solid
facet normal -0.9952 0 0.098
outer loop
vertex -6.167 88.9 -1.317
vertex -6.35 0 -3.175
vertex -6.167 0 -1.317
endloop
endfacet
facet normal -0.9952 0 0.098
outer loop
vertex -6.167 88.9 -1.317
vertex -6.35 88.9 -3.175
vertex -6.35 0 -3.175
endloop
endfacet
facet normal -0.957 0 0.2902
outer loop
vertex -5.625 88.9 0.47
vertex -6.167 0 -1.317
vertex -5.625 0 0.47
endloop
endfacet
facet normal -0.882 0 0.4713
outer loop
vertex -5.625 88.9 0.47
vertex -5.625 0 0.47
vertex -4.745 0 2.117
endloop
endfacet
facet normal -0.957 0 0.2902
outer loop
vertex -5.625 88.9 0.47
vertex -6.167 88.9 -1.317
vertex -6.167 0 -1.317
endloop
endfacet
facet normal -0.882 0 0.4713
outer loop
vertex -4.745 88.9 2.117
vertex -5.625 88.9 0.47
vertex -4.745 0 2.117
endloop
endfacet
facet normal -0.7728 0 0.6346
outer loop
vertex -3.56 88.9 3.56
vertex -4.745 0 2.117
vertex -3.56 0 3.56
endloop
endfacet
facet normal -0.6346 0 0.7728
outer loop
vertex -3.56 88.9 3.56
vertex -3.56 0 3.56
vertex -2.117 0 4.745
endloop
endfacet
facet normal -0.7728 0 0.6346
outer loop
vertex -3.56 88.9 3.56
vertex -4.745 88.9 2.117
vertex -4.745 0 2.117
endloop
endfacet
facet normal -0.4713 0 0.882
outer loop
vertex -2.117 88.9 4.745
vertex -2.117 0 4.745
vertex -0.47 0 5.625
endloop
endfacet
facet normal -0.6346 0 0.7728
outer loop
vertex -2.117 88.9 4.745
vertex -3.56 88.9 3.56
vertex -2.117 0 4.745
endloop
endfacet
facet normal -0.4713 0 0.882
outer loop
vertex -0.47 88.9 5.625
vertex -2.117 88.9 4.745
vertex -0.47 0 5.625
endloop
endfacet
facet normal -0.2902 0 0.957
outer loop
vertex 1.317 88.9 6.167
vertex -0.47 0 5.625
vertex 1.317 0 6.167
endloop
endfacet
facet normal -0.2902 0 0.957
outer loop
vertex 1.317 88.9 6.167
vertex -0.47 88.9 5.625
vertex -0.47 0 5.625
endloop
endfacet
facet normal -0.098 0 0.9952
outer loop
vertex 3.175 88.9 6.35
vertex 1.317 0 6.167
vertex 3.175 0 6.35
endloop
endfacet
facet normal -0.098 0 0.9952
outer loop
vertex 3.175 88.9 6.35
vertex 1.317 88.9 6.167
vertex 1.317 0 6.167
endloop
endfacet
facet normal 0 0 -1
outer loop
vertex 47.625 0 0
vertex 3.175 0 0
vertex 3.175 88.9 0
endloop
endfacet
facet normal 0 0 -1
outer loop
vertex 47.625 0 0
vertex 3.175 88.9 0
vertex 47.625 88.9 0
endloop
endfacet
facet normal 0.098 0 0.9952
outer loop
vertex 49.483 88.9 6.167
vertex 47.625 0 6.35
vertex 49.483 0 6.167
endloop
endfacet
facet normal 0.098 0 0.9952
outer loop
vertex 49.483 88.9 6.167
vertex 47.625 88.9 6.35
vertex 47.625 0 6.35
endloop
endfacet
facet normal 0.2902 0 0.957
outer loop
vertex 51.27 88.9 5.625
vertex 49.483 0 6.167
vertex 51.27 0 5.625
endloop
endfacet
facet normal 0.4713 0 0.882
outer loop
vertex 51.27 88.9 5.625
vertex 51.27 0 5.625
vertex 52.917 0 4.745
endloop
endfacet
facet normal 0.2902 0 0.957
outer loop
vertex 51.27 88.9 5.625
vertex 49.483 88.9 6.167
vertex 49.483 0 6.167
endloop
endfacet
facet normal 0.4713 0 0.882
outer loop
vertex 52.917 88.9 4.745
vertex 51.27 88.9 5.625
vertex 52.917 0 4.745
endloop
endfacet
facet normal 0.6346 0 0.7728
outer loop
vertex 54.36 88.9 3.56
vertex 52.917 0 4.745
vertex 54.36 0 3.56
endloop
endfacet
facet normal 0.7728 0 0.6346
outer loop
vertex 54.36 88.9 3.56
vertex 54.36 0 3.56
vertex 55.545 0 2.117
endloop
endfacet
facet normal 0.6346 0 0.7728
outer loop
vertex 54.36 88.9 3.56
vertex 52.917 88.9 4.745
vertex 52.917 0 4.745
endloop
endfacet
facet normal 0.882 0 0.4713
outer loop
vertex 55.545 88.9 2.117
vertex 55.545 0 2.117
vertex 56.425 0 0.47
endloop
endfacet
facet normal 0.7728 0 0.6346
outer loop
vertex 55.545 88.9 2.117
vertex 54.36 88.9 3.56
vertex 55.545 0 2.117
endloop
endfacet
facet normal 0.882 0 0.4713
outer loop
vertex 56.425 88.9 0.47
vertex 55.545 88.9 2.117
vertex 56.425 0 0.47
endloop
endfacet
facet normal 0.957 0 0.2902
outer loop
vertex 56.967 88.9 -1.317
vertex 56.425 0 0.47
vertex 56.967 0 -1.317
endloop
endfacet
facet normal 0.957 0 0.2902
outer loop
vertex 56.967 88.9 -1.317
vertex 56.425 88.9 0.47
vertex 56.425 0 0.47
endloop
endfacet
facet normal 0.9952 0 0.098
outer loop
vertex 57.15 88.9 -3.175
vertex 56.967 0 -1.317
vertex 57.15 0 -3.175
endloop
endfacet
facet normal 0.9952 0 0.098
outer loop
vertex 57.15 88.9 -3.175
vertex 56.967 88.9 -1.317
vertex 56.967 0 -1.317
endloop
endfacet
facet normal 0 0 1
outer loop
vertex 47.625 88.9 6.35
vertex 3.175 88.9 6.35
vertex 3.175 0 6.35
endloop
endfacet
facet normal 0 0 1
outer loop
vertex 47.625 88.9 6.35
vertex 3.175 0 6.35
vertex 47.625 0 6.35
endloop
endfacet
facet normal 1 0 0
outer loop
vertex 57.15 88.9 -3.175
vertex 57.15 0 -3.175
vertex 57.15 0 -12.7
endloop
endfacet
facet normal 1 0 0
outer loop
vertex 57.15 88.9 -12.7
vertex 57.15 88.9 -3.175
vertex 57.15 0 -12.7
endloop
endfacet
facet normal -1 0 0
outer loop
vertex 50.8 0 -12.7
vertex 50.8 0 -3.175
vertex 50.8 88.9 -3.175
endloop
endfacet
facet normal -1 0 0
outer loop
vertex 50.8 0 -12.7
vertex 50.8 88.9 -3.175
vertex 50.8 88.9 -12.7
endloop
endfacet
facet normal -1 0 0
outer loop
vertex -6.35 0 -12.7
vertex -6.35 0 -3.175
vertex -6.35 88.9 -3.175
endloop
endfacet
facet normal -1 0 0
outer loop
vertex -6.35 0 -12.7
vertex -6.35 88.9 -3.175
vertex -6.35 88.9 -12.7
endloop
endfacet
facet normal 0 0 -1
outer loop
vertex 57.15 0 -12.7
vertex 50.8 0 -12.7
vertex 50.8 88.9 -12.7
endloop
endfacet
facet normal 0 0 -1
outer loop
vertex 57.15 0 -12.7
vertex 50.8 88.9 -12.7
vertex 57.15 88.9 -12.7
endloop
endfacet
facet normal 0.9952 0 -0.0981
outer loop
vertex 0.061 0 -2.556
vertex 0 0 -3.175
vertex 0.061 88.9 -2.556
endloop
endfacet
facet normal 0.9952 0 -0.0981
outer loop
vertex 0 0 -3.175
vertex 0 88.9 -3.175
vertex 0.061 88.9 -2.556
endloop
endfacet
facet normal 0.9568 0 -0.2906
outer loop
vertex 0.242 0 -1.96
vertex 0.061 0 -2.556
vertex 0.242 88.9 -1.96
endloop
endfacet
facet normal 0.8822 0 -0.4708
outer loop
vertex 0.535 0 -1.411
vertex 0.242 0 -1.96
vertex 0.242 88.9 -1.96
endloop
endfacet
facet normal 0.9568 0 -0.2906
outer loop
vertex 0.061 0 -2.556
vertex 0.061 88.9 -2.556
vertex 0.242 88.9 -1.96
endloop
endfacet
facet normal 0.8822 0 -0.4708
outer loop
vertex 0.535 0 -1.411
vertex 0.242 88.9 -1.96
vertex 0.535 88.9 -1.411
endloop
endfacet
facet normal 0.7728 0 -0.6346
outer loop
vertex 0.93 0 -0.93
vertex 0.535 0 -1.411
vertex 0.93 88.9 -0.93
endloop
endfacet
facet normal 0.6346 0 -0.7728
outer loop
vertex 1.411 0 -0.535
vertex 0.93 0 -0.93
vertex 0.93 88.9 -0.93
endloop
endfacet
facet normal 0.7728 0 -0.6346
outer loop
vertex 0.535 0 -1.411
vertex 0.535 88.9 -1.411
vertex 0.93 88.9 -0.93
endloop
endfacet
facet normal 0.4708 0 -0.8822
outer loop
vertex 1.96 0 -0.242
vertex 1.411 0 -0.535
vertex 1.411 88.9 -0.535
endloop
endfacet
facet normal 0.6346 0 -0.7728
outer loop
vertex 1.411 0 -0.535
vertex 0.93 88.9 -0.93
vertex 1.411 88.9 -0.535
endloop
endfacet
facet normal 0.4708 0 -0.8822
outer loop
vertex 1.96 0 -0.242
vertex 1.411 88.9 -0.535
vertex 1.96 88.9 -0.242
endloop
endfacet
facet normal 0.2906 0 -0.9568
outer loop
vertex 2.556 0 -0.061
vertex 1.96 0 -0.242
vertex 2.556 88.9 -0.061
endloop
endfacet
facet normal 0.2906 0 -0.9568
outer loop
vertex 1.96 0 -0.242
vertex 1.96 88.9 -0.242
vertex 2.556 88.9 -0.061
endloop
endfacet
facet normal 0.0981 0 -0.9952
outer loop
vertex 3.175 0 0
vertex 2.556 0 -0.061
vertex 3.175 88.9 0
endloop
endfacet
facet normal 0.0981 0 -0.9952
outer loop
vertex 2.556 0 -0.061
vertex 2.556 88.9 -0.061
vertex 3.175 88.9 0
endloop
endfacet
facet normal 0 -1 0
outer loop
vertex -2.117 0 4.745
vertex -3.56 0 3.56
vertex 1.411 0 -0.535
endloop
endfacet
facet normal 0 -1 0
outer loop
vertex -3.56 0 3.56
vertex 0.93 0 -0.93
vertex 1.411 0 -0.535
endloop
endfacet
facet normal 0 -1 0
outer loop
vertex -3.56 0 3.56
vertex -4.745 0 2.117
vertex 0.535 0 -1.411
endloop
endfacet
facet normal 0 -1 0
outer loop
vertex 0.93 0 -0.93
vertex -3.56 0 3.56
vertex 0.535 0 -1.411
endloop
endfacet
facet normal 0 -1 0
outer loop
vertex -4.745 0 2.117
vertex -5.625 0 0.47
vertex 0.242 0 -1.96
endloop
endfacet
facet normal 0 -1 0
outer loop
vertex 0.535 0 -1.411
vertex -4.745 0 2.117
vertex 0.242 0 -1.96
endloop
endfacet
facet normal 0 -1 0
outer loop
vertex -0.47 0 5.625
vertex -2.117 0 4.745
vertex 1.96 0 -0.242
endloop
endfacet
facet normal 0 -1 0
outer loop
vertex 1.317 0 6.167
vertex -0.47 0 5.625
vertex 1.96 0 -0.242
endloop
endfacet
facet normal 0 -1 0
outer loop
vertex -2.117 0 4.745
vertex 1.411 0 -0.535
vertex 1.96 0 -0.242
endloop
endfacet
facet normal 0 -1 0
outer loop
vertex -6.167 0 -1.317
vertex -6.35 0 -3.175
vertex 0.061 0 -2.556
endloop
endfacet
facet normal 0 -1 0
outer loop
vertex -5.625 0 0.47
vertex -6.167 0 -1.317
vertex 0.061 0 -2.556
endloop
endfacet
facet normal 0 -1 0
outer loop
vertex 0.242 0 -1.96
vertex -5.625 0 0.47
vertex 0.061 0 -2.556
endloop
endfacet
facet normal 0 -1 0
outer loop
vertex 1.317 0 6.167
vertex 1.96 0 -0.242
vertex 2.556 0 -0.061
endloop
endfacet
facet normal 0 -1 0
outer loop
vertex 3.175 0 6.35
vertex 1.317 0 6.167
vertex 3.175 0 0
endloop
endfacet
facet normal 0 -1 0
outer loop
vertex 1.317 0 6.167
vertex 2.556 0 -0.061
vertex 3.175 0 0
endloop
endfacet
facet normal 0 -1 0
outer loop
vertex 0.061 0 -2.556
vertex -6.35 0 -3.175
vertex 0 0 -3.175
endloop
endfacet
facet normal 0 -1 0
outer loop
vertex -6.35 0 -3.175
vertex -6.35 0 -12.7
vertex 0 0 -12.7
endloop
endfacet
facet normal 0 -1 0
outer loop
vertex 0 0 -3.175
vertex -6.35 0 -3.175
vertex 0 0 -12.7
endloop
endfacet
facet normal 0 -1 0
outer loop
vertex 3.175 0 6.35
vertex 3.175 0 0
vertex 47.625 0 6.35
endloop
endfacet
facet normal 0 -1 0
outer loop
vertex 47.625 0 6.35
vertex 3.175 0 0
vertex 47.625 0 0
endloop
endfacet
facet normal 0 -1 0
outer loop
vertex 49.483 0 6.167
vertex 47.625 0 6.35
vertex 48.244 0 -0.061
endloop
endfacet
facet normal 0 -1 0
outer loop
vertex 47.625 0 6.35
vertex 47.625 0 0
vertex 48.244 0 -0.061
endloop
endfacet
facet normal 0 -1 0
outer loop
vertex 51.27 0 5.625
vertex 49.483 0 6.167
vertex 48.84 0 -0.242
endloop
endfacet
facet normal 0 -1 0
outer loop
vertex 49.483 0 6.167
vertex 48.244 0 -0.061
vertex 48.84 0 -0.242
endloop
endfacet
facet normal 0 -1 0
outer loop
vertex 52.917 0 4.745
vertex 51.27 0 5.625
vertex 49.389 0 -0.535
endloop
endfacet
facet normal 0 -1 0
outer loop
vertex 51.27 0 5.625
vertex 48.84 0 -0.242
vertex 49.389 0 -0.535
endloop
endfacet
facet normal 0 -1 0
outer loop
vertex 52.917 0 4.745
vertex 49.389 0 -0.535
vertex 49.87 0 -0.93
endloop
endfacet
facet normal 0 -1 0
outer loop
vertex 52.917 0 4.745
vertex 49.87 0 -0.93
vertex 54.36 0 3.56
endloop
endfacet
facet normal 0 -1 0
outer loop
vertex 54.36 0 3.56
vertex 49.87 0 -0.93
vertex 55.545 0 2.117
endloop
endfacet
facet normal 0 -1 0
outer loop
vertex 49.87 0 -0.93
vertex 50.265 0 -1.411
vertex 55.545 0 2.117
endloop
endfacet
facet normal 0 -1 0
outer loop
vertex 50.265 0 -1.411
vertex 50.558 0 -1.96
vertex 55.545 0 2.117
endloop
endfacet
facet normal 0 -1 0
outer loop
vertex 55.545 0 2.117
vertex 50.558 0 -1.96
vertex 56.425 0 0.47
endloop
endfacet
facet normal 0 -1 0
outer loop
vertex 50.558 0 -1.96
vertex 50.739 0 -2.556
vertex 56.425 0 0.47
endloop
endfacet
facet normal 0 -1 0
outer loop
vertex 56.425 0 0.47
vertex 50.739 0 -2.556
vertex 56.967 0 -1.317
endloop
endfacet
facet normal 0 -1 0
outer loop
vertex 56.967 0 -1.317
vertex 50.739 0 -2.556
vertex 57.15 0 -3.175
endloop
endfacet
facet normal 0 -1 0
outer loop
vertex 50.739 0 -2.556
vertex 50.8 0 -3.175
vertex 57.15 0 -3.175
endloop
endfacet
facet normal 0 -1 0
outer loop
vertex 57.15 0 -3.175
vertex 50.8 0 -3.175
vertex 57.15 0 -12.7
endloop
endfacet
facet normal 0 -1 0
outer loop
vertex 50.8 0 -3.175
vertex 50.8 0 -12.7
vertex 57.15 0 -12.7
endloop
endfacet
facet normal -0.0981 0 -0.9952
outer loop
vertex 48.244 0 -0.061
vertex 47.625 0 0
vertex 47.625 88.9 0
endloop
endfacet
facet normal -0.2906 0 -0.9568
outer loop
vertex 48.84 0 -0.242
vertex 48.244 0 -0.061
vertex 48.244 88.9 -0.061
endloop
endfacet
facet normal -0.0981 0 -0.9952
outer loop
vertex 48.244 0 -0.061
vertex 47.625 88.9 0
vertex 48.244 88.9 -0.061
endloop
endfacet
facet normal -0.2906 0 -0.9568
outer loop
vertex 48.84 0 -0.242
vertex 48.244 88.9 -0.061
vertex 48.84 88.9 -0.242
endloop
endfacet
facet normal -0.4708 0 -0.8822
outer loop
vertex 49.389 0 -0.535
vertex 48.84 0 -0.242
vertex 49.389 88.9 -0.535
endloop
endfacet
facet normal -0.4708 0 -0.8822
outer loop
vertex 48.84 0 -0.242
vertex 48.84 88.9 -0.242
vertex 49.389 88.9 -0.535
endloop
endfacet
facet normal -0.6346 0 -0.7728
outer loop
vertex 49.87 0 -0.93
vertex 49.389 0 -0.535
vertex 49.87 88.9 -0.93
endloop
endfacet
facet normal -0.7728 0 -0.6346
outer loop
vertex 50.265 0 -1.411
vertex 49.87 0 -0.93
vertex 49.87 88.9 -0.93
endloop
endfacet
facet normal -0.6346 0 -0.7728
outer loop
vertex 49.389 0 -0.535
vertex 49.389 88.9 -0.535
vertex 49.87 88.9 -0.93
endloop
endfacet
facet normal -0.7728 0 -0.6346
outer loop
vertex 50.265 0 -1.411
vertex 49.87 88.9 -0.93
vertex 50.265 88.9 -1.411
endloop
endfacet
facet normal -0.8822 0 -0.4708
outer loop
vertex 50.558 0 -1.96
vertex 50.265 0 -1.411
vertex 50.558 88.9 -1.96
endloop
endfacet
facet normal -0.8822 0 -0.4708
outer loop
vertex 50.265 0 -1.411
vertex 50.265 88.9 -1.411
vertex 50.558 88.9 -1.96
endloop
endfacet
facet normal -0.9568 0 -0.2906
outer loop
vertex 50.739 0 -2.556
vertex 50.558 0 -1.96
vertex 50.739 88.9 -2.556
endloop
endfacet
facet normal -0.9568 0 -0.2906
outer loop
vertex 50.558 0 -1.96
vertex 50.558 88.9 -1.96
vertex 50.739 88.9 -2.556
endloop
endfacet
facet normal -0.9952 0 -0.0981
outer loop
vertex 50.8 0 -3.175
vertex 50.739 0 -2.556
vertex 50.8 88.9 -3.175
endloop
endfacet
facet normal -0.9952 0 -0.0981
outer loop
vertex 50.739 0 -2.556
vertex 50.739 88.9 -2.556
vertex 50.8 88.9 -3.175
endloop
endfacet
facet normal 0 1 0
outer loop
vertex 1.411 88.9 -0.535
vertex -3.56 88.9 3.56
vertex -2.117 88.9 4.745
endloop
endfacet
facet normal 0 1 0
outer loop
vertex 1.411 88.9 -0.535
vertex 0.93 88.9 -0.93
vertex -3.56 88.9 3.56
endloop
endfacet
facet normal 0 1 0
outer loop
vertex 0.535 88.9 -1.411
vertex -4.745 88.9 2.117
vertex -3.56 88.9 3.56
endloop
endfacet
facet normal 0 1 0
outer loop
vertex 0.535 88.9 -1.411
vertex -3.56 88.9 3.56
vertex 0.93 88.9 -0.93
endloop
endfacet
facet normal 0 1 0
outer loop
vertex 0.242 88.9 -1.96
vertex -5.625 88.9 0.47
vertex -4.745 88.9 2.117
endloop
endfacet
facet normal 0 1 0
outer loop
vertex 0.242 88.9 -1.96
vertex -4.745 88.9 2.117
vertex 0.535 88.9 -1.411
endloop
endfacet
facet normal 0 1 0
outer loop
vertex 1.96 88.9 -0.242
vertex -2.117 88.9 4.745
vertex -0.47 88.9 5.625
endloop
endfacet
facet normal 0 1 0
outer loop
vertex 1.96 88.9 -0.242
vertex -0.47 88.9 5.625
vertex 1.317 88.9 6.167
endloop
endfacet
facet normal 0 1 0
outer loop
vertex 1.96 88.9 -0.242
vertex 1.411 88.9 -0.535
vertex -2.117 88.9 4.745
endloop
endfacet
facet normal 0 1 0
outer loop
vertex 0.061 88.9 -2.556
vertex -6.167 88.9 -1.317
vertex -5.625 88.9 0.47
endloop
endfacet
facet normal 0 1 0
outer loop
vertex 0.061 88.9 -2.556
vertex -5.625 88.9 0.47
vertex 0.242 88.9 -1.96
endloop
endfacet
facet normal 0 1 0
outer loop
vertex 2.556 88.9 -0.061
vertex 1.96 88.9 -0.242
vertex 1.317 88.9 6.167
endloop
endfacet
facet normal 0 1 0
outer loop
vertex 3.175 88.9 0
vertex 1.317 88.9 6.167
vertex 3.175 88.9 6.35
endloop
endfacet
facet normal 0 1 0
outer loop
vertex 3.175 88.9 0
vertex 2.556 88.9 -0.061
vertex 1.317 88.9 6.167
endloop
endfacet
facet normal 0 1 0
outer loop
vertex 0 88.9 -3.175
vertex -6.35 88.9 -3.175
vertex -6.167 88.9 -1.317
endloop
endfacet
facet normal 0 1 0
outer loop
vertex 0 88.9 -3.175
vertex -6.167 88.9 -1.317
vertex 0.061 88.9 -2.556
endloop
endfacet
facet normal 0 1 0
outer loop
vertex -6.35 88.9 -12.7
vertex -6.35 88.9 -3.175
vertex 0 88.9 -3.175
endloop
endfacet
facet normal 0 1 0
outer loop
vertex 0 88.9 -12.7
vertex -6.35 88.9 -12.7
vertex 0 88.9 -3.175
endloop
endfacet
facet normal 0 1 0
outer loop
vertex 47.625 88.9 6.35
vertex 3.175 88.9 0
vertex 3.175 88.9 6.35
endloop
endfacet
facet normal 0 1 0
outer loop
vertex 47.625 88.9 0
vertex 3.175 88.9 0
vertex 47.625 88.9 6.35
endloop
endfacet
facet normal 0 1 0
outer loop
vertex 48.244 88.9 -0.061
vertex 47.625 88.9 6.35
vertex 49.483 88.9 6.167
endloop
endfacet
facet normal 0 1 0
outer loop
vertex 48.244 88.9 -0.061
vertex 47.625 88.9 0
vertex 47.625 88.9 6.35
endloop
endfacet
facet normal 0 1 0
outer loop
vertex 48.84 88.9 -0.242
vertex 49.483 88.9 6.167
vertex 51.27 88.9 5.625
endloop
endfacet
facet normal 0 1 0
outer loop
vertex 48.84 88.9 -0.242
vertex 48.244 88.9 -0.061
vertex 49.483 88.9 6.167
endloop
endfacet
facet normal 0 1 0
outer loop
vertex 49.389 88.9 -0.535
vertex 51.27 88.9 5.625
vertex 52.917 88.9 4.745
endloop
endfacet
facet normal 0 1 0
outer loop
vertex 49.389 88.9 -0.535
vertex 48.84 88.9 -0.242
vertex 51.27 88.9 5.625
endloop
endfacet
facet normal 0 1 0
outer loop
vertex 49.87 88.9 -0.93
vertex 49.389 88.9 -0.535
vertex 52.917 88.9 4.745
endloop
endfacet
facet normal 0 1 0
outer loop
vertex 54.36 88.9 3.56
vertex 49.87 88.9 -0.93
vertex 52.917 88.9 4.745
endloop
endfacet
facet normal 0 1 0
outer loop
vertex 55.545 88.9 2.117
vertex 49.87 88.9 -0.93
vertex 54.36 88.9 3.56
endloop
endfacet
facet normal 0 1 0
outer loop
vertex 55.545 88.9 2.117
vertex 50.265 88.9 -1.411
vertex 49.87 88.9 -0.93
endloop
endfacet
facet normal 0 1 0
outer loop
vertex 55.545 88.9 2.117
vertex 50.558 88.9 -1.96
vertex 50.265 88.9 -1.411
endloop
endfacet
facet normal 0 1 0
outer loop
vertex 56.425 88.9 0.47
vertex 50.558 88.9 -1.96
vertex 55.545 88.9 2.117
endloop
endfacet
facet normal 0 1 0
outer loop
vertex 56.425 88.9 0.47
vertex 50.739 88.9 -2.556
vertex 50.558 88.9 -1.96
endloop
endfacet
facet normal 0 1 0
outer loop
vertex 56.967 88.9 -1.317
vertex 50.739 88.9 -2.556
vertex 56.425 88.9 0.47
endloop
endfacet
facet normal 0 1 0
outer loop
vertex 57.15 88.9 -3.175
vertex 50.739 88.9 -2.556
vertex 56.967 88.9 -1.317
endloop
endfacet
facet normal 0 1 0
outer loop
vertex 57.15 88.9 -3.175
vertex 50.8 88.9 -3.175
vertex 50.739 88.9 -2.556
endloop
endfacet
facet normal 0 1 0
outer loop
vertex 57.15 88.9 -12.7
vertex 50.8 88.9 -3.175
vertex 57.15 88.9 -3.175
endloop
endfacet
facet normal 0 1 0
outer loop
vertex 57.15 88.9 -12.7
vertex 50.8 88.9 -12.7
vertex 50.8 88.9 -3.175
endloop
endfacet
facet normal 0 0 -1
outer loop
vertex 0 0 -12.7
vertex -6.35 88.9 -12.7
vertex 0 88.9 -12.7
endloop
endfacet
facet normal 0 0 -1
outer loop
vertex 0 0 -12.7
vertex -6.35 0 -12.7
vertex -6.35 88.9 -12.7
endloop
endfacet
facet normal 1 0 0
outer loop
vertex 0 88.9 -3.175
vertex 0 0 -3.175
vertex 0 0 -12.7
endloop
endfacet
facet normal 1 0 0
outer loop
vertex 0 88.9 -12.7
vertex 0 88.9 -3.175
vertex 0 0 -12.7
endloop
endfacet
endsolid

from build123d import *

# Parameters (mm, degrees)
SKETCH2_W           = 50.8
SKETCH2_H           = 12.7
BOSS_EXTRUDE1_DEPTH = 88.9
FILLET2_R           = 3.175
SHELL1_T            = 6.35


with BuildPart() as part:
    # Sketch2 → Boss-Extrude1 (new body)
    with BuildSketch(Plane(origin=(0, 0, 0), x_dir=(1, 0, 0), z_dir=(0, 1, 0))):
        with Locations((25.4, 6.35)):
            Rectangle(SKETCH2_W, SKETCH2_H)
    extrude(amount=BOSS_EXTRUDE1_DEPTH)

    # Fillet2
    fillet2_edges = [part.edges().sort_by_distance(p)[0] for p in [
        (50.8, 44.45, 0),
        (0, 44.45, 0),
    ]]
    fillet(fillet2_edges, radius=FILLET2_R)

    # Shell1
    shell1_openings = [part.faces().sort_by_distance(p)[0] for p in [
        (25.4, 0, -6.38808439),
        (25.4, 88.9, -6.38808439),
        (25.4, 44.45, -12.7),
    ]]
    offset(amount=SHELL1_T, openings=shell1_openings, kind=Kind.INTERSECTION)


solid = part.part
